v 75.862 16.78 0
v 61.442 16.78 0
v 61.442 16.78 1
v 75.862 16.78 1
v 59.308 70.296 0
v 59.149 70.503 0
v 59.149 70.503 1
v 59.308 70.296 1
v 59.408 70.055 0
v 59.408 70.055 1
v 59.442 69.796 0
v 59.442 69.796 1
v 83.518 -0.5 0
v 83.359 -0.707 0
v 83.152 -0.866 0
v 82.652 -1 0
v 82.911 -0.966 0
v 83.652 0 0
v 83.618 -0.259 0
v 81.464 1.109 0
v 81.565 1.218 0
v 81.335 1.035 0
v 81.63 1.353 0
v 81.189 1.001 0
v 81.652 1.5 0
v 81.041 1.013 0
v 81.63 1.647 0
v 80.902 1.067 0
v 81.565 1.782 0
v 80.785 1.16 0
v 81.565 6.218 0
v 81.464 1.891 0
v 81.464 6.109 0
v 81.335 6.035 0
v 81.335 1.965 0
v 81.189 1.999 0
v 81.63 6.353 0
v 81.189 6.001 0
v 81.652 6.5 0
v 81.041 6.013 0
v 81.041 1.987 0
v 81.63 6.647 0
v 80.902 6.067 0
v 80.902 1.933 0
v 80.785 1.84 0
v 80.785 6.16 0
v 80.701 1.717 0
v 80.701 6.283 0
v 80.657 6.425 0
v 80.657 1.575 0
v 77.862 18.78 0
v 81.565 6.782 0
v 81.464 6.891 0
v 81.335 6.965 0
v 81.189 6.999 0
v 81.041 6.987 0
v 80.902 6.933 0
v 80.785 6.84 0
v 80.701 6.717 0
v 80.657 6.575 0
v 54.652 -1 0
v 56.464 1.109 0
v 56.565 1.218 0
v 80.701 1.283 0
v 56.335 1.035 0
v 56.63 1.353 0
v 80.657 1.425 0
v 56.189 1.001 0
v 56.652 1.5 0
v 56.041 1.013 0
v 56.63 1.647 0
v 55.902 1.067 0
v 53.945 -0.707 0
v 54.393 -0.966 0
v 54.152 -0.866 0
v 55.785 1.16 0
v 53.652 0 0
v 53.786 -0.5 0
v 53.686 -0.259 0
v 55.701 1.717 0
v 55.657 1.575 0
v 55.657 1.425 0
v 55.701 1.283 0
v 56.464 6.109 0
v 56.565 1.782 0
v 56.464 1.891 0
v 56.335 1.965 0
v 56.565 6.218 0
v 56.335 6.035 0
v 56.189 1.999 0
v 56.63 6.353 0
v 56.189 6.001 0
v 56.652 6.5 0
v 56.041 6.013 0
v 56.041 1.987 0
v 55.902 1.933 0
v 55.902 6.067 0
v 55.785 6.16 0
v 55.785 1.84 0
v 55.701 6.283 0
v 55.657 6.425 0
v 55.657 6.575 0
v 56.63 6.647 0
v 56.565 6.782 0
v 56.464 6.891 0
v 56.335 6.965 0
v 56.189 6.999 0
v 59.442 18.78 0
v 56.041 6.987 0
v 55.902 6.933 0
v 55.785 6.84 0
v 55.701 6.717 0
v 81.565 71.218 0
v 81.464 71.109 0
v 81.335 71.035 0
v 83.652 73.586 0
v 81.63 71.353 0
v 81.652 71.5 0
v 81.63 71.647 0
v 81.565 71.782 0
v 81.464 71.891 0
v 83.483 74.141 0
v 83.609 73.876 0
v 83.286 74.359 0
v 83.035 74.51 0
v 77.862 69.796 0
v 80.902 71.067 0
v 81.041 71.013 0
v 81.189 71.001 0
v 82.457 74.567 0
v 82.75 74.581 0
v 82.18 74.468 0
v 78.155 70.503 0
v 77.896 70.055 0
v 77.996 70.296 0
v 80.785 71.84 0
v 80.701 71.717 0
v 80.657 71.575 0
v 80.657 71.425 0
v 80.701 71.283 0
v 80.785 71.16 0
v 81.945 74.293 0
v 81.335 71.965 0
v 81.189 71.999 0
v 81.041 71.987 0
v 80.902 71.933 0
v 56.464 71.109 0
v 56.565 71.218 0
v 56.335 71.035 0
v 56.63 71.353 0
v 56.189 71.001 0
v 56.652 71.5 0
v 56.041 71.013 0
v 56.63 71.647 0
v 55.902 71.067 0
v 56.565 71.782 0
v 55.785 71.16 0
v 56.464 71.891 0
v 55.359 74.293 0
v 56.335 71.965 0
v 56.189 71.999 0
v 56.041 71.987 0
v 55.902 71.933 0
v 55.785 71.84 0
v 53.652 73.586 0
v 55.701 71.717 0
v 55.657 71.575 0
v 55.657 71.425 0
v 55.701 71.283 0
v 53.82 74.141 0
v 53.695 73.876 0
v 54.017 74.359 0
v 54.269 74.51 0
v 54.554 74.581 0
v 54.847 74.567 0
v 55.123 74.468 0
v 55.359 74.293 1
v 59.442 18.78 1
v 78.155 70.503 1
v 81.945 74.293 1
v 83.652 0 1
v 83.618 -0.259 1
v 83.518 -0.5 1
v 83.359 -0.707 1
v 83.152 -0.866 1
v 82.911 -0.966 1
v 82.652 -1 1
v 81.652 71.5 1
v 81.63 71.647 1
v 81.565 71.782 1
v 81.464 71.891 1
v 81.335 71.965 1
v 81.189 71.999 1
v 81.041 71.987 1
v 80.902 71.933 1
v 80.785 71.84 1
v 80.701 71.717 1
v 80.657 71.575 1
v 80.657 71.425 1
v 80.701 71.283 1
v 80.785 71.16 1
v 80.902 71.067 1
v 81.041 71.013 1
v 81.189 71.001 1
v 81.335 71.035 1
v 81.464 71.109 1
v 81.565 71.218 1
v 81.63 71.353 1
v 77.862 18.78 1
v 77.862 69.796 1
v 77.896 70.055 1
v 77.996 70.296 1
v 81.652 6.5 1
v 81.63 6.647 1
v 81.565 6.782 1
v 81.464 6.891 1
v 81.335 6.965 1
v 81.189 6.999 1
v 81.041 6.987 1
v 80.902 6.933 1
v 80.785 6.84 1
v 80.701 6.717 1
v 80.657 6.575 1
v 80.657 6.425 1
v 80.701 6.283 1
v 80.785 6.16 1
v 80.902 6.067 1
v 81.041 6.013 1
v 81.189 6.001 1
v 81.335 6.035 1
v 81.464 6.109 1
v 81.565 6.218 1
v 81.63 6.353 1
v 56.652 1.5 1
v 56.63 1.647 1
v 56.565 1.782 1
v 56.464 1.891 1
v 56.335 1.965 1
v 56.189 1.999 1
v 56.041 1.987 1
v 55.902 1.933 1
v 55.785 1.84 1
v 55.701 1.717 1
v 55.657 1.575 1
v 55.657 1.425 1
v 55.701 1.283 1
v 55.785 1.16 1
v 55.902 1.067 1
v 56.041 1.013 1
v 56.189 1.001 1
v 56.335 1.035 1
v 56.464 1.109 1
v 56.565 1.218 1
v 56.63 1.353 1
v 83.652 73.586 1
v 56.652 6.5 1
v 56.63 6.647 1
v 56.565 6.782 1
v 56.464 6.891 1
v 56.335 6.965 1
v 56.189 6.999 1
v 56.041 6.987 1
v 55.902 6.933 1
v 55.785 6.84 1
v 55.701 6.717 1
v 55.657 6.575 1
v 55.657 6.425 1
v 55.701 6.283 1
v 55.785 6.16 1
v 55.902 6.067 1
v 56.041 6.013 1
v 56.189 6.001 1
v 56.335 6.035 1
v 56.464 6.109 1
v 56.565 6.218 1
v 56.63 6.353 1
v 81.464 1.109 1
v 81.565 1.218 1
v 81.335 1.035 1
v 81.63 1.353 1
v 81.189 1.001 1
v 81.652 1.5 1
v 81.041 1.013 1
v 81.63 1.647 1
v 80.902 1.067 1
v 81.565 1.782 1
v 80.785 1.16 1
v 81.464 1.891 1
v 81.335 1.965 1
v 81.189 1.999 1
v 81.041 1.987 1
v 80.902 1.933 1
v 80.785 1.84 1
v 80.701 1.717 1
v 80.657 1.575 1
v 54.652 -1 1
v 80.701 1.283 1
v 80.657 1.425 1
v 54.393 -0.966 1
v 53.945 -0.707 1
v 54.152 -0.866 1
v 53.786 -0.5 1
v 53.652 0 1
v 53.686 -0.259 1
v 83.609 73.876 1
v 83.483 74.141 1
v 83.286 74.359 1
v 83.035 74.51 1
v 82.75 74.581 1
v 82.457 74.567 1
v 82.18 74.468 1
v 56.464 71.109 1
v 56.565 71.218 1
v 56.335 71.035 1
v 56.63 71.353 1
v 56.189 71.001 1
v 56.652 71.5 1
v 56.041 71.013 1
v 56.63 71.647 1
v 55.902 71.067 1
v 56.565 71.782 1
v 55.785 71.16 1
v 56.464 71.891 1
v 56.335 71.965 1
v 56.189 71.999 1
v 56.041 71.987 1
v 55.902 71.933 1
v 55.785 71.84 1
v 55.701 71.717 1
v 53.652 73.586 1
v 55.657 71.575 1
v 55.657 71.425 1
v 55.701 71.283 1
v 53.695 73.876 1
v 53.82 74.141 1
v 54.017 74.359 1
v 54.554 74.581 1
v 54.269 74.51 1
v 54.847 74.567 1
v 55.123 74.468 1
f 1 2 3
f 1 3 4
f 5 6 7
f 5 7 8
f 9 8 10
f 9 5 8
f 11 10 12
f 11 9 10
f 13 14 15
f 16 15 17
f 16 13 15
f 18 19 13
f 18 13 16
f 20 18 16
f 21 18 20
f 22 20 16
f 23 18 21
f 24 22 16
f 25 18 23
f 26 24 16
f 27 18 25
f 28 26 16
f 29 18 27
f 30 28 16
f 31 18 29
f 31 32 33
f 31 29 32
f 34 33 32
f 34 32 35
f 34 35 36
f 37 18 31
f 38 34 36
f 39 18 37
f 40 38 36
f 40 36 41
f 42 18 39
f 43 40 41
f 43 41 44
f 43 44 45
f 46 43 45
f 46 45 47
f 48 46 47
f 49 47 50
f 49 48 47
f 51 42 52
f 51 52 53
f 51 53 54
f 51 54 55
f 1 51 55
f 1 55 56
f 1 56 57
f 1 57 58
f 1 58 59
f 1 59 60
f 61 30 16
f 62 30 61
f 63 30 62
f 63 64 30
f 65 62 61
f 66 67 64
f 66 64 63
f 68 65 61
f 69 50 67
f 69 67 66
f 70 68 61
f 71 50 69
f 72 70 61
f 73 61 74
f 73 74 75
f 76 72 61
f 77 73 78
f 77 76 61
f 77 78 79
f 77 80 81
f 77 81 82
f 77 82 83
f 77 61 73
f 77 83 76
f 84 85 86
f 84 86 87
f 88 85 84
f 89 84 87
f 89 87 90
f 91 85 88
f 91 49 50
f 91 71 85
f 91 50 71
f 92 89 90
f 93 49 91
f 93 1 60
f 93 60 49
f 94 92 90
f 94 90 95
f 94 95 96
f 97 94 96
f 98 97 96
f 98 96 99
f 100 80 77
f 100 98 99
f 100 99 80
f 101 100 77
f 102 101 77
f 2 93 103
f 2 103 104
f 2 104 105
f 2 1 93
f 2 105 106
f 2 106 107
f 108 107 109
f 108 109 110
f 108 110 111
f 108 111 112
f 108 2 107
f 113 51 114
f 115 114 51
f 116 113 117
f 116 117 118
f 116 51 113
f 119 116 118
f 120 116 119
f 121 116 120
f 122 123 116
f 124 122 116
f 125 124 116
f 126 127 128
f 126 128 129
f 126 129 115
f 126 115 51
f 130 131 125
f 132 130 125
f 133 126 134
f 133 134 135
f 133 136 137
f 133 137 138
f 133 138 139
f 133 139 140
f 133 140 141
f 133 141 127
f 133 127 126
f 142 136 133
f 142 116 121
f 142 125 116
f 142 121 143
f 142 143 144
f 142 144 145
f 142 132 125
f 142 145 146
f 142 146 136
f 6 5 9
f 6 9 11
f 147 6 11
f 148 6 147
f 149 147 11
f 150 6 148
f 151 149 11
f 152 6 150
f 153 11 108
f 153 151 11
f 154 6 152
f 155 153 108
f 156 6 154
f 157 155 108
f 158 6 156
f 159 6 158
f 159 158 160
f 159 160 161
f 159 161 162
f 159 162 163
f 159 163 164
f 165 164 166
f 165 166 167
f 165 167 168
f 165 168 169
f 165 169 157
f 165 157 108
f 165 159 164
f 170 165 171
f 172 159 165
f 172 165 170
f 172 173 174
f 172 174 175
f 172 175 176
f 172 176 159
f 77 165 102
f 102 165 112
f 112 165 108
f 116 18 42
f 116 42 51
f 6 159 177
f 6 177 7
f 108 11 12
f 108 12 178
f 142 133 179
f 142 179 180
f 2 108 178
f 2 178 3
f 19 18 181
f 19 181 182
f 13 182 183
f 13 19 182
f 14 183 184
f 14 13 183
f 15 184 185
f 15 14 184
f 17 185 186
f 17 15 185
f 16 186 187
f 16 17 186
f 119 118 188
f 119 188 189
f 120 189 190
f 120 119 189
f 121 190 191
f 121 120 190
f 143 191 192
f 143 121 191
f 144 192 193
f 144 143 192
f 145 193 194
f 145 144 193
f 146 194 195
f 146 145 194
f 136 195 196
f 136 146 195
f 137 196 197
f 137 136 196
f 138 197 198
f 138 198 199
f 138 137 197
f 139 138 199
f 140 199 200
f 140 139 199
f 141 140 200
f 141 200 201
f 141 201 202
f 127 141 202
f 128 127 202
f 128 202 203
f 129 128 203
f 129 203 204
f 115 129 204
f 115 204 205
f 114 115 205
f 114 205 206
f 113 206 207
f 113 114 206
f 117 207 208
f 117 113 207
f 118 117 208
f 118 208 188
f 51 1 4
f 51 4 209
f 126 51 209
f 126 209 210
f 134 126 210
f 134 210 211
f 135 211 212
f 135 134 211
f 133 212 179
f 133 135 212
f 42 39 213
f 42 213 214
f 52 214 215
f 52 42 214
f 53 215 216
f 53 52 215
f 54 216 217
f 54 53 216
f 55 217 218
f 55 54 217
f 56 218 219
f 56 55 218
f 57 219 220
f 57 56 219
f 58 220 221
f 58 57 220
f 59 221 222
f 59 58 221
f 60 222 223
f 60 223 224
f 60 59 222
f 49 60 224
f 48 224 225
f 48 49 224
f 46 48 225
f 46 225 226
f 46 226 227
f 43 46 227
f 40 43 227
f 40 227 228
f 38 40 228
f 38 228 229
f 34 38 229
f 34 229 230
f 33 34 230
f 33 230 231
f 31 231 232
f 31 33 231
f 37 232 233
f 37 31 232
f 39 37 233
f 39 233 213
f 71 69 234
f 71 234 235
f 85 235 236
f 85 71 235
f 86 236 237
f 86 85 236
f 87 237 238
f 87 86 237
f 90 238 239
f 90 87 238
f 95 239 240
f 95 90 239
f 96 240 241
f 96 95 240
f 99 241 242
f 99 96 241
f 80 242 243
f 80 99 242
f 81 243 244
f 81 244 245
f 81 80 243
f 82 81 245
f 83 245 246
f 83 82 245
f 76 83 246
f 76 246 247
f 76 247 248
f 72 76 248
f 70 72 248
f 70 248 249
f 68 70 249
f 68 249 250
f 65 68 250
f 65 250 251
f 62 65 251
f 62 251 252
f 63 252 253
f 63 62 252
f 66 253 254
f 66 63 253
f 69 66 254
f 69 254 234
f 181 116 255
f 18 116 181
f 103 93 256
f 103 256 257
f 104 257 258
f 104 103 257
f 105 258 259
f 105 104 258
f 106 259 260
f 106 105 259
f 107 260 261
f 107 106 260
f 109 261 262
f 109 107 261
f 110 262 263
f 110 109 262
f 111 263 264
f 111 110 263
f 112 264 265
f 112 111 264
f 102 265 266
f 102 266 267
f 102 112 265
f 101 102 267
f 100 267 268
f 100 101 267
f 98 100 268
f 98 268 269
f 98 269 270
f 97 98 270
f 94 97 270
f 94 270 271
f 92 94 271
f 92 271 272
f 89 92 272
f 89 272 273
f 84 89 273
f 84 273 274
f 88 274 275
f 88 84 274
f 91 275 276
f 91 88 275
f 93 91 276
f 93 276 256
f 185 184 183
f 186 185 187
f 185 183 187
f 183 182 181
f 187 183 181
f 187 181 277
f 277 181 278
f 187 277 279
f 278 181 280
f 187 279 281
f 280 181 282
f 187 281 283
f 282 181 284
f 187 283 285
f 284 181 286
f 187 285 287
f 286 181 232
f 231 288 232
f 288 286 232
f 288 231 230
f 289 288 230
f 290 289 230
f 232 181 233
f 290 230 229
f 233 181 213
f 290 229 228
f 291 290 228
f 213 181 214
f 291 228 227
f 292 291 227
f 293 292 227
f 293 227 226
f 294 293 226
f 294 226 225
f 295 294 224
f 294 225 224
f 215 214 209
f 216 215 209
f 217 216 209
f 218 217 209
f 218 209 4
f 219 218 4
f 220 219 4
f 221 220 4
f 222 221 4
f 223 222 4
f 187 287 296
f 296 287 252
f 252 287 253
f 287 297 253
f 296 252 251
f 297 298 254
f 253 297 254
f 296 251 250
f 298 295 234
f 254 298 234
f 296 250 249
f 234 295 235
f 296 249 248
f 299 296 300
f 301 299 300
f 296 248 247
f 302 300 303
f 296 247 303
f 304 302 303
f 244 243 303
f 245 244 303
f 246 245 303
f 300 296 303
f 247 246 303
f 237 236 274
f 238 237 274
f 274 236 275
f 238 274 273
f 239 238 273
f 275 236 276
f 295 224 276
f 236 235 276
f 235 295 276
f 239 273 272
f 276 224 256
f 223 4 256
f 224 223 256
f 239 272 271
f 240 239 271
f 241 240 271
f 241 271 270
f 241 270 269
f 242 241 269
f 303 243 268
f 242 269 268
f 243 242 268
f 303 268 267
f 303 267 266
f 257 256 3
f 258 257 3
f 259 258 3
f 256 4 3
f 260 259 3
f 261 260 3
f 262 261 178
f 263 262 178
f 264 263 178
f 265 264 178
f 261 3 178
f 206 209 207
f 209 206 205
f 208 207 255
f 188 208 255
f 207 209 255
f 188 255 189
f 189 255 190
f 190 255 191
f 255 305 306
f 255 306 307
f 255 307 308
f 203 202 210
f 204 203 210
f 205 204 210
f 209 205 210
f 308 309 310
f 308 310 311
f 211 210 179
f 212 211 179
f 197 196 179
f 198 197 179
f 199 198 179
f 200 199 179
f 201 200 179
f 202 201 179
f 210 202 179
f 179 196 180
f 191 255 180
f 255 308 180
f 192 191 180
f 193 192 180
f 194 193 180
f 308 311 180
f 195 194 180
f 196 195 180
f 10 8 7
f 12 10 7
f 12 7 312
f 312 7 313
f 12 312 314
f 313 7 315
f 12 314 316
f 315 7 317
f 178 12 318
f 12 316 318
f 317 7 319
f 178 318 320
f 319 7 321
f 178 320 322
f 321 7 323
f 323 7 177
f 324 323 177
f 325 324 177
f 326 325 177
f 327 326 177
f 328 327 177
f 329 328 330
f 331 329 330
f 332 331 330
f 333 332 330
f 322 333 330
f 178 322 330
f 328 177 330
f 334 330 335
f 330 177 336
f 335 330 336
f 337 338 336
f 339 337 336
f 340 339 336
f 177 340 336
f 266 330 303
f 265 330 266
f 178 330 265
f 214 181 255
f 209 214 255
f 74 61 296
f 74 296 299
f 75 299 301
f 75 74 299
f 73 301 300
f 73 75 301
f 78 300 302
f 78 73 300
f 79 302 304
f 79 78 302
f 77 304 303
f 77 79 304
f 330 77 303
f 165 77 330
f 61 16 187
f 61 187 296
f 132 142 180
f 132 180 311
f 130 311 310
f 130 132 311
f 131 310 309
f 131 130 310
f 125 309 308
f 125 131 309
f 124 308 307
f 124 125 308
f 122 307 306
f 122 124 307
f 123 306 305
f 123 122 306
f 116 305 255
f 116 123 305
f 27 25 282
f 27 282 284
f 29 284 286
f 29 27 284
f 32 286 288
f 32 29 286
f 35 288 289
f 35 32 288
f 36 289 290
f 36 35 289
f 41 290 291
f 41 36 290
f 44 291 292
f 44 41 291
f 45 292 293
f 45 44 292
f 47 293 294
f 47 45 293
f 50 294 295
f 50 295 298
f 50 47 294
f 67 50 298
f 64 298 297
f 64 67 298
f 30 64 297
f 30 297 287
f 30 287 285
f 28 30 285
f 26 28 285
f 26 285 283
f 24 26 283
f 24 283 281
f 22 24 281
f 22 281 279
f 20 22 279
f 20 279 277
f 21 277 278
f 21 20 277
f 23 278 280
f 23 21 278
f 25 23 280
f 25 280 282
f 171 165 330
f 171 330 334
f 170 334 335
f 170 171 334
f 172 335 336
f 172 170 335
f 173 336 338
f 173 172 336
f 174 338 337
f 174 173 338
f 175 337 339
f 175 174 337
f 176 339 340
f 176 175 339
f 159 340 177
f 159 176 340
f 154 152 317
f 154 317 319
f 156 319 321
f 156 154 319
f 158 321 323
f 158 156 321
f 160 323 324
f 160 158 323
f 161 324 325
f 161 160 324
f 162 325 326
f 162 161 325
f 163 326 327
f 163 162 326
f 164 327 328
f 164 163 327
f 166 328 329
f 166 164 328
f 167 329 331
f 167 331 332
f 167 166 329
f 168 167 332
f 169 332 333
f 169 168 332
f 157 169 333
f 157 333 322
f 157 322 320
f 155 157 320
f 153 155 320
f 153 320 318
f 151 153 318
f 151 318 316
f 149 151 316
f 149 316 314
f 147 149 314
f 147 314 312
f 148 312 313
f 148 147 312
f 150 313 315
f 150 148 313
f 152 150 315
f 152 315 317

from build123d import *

# Parameters (mm, degrees)
MODEL_R             = 0.5
BOSS_EXTRUDE1_DEPTH = 1


with BuildPart() as part:
    # Model → Boss-Extrude1 (new body)
    with BuildSketch(Plane.XY):
        with BuildLine():
            Line((82.651854623, -0.999998655), (54.651854623, -0.999998655))
            ThreePointArc((54.651854623, -0.999998655), (53.944747842, -0.707105436), (53.651854623, 1.345e-06))
            Line((53.651854623, 1.345e-06), (53.651854623, 73.585787783))
            ThreePointArc((53.651854623, 73.585787783), (54.26917119, 74.509667315), (55.358961404, 74.292894564))
            Line((55.358961404, 74.292894564), (59.148961404, 70.502894564))
            ThreePointArc((59.148961404, 70.502894564), (59.365734155, 70.178471215), (59.441854623, 69.795787783))
            Line((59.441854623, 69.795787783), (59.441854623, 18.780001734))
            Line((59.441854623, 18.780001734), (61.441849513, 16.780001345))
            Line((61.441849513, 16.780001345), (75.861849513, 16.780001345))
            Line((75.861849513, 16.780001345), (77.861854623, 18.780001734))
            Line((77.861854623, 18.780001734), (77.861854623, 69.795787783))
            ThreePointArc((77.861854623, 69.795787783), (77.93797509, 70.178471215), (78.154747842, 70.502894564))
            Line((78.154747842, 70.502894564), (81.944747842, 74.292894564))
            ThreePointArc((81.944747842, 74.292894564), (83.034538055, 74.509667315), (83.651854623, 73.585787783))
            Line((83.651854623, 73.585787783), (83.651854623, 1.345e-06))
            ThreePointArc((83.651854623, 1.345e-06), (83.358961404, -0.707105436), (82.651854623, -0.999998655))
        make_face()
        with Locations((56.151854623, 6.500001345)):
            Circle(MODEL_R, mode=Mode.SUBTRACT)
        with Locations((56.151854623, 71.500001345)):
            Circle(MODEL_R, mode=Mode.SUBTRACT)
        with Locations((81.151854623, 6.500001345)):
            Circle(MODEL_R, mode=Mode.SUBTRACT)
        with Locations((81.151854623, 71.500001345)):
            Circle(MODEL_R, mode=Mode.SUBTRACT)
        with Locations((56.151854623, 1.500001345)):
            Circle(MODEL_R, mode=Mode.SUBTRACT)
        with Locations((81.151854623, 1.500001345)):
            Circle(MODEL_R, mode=Mode.SUBTRACT)
    extrude(amount=BOSS_EXTRUDE1_DEPTH)


solid = part.part
